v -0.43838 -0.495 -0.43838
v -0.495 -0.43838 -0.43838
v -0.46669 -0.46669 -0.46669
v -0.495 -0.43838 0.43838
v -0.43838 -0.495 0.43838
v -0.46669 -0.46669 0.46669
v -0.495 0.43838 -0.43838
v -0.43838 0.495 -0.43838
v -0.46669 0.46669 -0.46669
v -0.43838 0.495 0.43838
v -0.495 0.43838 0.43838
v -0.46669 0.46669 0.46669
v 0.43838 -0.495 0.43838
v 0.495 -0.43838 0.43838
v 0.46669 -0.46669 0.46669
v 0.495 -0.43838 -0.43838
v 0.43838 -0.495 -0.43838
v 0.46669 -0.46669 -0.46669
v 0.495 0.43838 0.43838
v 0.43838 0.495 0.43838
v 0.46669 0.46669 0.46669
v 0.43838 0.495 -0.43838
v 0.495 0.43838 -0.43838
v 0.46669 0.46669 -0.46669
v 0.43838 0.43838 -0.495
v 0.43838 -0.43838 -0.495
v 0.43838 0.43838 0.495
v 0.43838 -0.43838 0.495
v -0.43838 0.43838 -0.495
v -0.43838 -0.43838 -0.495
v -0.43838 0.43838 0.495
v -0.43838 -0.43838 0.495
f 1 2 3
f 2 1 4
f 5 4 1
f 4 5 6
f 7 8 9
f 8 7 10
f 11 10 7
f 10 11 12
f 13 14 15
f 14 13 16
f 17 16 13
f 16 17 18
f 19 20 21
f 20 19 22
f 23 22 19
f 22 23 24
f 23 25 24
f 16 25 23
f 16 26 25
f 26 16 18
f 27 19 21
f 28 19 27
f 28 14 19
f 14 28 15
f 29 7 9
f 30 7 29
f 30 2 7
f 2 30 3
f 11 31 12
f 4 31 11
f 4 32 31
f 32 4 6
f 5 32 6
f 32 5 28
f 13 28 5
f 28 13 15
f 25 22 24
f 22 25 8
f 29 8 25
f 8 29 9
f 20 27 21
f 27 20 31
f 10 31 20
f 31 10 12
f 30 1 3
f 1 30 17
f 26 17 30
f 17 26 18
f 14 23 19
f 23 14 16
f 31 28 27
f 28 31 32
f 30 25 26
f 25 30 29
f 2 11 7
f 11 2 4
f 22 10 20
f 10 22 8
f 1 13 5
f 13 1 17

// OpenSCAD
s=.99;

intersection() {
    cube([s,s,s],center=true);
    intersection() {
        t=s*4/3;
        rotate([0,0,45])
        cube([t,t,t],center=true);
        rotate([0,45,0])
        cube([t,t,t],center=true);
        rotate([45,0,0])
        cube([t,t,t],center=true);
    }
}
